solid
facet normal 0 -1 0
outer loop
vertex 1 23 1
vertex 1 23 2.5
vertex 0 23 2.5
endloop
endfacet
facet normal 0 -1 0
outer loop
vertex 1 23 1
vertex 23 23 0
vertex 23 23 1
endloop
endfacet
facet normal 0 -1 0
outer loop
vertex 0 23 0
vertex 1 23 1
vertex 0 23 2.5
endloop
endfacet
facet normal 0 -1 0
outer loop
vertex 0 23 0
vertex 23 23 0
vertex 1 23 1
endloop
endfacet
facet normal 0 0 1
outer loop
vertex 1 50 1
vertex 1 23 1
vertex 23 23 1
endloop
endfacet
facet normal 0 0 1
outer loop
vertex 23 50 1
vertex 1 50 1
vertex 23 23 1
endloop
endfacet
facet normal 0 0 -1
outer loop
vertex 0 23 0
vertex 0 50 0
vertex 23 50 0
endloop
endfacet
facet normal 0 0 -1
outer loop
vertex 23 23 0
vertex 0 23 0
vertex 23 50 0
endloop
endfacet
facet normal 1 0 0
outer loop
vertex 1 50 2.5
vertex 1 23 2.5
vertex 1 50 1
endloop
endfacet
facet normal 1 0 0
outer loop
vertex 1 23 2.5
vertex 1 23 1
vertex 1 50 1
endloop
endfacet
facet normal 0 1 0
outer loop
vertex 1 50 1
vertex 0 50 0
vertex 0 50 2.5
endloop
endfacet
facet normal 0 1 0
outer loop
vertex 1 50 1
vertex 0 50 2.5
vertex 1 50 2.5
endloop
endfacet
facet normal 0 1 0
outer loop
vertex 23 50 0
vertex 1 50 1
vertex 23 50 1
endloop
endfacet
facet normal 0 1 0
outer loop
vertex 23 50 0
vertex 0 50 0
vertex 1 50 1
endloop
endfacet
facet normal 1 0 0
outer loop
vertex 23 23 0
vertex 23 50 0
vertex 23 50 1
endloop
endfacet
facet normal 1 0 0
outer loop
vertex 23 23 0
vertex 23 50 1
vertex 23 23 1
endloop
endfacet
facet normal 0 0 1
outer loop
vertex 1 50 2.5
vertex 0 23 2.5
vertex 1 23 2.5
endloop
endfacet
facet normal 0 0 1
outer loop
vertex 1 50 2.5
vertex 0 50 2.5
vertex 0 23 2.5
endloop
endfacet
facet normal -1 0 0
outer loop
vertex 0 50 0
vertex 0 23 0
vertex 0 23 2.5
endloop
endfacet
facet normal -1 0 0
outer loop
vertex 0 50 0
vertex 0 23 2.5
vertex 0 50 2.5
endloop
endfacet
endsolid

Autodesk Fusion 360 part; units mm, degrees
sketch "Sketch1" plane through (0, 0, 0) normal (0, 0, 1) x (1, 0, 0)
  line L0 (0, 50) -> (23, 50)
  line L1 (23, 50) -> (23, 23)
  line L2 (23, 23) -> (0, 23)
  line L3 (0, 23) -> (0, 50)
  line L4 (0, 23) -> (1, 23)
  line L5 (1, 23) -> (1, 50)
  line L6 (1, 50) -> (0, 50)
  line L7 (0, 50) -> (0, 23)
  dimension "d1" = 23
  dimension "d2" = 27
extrude "Extrude1" add sketch "Sketch1" along normal blind 1 contours L0 L1 L2 L5
extrude "Extrude2" add sketch "Sketch1" along normal blind 2.5 contours L0 L2 L3 L4 L5 L6 L7
